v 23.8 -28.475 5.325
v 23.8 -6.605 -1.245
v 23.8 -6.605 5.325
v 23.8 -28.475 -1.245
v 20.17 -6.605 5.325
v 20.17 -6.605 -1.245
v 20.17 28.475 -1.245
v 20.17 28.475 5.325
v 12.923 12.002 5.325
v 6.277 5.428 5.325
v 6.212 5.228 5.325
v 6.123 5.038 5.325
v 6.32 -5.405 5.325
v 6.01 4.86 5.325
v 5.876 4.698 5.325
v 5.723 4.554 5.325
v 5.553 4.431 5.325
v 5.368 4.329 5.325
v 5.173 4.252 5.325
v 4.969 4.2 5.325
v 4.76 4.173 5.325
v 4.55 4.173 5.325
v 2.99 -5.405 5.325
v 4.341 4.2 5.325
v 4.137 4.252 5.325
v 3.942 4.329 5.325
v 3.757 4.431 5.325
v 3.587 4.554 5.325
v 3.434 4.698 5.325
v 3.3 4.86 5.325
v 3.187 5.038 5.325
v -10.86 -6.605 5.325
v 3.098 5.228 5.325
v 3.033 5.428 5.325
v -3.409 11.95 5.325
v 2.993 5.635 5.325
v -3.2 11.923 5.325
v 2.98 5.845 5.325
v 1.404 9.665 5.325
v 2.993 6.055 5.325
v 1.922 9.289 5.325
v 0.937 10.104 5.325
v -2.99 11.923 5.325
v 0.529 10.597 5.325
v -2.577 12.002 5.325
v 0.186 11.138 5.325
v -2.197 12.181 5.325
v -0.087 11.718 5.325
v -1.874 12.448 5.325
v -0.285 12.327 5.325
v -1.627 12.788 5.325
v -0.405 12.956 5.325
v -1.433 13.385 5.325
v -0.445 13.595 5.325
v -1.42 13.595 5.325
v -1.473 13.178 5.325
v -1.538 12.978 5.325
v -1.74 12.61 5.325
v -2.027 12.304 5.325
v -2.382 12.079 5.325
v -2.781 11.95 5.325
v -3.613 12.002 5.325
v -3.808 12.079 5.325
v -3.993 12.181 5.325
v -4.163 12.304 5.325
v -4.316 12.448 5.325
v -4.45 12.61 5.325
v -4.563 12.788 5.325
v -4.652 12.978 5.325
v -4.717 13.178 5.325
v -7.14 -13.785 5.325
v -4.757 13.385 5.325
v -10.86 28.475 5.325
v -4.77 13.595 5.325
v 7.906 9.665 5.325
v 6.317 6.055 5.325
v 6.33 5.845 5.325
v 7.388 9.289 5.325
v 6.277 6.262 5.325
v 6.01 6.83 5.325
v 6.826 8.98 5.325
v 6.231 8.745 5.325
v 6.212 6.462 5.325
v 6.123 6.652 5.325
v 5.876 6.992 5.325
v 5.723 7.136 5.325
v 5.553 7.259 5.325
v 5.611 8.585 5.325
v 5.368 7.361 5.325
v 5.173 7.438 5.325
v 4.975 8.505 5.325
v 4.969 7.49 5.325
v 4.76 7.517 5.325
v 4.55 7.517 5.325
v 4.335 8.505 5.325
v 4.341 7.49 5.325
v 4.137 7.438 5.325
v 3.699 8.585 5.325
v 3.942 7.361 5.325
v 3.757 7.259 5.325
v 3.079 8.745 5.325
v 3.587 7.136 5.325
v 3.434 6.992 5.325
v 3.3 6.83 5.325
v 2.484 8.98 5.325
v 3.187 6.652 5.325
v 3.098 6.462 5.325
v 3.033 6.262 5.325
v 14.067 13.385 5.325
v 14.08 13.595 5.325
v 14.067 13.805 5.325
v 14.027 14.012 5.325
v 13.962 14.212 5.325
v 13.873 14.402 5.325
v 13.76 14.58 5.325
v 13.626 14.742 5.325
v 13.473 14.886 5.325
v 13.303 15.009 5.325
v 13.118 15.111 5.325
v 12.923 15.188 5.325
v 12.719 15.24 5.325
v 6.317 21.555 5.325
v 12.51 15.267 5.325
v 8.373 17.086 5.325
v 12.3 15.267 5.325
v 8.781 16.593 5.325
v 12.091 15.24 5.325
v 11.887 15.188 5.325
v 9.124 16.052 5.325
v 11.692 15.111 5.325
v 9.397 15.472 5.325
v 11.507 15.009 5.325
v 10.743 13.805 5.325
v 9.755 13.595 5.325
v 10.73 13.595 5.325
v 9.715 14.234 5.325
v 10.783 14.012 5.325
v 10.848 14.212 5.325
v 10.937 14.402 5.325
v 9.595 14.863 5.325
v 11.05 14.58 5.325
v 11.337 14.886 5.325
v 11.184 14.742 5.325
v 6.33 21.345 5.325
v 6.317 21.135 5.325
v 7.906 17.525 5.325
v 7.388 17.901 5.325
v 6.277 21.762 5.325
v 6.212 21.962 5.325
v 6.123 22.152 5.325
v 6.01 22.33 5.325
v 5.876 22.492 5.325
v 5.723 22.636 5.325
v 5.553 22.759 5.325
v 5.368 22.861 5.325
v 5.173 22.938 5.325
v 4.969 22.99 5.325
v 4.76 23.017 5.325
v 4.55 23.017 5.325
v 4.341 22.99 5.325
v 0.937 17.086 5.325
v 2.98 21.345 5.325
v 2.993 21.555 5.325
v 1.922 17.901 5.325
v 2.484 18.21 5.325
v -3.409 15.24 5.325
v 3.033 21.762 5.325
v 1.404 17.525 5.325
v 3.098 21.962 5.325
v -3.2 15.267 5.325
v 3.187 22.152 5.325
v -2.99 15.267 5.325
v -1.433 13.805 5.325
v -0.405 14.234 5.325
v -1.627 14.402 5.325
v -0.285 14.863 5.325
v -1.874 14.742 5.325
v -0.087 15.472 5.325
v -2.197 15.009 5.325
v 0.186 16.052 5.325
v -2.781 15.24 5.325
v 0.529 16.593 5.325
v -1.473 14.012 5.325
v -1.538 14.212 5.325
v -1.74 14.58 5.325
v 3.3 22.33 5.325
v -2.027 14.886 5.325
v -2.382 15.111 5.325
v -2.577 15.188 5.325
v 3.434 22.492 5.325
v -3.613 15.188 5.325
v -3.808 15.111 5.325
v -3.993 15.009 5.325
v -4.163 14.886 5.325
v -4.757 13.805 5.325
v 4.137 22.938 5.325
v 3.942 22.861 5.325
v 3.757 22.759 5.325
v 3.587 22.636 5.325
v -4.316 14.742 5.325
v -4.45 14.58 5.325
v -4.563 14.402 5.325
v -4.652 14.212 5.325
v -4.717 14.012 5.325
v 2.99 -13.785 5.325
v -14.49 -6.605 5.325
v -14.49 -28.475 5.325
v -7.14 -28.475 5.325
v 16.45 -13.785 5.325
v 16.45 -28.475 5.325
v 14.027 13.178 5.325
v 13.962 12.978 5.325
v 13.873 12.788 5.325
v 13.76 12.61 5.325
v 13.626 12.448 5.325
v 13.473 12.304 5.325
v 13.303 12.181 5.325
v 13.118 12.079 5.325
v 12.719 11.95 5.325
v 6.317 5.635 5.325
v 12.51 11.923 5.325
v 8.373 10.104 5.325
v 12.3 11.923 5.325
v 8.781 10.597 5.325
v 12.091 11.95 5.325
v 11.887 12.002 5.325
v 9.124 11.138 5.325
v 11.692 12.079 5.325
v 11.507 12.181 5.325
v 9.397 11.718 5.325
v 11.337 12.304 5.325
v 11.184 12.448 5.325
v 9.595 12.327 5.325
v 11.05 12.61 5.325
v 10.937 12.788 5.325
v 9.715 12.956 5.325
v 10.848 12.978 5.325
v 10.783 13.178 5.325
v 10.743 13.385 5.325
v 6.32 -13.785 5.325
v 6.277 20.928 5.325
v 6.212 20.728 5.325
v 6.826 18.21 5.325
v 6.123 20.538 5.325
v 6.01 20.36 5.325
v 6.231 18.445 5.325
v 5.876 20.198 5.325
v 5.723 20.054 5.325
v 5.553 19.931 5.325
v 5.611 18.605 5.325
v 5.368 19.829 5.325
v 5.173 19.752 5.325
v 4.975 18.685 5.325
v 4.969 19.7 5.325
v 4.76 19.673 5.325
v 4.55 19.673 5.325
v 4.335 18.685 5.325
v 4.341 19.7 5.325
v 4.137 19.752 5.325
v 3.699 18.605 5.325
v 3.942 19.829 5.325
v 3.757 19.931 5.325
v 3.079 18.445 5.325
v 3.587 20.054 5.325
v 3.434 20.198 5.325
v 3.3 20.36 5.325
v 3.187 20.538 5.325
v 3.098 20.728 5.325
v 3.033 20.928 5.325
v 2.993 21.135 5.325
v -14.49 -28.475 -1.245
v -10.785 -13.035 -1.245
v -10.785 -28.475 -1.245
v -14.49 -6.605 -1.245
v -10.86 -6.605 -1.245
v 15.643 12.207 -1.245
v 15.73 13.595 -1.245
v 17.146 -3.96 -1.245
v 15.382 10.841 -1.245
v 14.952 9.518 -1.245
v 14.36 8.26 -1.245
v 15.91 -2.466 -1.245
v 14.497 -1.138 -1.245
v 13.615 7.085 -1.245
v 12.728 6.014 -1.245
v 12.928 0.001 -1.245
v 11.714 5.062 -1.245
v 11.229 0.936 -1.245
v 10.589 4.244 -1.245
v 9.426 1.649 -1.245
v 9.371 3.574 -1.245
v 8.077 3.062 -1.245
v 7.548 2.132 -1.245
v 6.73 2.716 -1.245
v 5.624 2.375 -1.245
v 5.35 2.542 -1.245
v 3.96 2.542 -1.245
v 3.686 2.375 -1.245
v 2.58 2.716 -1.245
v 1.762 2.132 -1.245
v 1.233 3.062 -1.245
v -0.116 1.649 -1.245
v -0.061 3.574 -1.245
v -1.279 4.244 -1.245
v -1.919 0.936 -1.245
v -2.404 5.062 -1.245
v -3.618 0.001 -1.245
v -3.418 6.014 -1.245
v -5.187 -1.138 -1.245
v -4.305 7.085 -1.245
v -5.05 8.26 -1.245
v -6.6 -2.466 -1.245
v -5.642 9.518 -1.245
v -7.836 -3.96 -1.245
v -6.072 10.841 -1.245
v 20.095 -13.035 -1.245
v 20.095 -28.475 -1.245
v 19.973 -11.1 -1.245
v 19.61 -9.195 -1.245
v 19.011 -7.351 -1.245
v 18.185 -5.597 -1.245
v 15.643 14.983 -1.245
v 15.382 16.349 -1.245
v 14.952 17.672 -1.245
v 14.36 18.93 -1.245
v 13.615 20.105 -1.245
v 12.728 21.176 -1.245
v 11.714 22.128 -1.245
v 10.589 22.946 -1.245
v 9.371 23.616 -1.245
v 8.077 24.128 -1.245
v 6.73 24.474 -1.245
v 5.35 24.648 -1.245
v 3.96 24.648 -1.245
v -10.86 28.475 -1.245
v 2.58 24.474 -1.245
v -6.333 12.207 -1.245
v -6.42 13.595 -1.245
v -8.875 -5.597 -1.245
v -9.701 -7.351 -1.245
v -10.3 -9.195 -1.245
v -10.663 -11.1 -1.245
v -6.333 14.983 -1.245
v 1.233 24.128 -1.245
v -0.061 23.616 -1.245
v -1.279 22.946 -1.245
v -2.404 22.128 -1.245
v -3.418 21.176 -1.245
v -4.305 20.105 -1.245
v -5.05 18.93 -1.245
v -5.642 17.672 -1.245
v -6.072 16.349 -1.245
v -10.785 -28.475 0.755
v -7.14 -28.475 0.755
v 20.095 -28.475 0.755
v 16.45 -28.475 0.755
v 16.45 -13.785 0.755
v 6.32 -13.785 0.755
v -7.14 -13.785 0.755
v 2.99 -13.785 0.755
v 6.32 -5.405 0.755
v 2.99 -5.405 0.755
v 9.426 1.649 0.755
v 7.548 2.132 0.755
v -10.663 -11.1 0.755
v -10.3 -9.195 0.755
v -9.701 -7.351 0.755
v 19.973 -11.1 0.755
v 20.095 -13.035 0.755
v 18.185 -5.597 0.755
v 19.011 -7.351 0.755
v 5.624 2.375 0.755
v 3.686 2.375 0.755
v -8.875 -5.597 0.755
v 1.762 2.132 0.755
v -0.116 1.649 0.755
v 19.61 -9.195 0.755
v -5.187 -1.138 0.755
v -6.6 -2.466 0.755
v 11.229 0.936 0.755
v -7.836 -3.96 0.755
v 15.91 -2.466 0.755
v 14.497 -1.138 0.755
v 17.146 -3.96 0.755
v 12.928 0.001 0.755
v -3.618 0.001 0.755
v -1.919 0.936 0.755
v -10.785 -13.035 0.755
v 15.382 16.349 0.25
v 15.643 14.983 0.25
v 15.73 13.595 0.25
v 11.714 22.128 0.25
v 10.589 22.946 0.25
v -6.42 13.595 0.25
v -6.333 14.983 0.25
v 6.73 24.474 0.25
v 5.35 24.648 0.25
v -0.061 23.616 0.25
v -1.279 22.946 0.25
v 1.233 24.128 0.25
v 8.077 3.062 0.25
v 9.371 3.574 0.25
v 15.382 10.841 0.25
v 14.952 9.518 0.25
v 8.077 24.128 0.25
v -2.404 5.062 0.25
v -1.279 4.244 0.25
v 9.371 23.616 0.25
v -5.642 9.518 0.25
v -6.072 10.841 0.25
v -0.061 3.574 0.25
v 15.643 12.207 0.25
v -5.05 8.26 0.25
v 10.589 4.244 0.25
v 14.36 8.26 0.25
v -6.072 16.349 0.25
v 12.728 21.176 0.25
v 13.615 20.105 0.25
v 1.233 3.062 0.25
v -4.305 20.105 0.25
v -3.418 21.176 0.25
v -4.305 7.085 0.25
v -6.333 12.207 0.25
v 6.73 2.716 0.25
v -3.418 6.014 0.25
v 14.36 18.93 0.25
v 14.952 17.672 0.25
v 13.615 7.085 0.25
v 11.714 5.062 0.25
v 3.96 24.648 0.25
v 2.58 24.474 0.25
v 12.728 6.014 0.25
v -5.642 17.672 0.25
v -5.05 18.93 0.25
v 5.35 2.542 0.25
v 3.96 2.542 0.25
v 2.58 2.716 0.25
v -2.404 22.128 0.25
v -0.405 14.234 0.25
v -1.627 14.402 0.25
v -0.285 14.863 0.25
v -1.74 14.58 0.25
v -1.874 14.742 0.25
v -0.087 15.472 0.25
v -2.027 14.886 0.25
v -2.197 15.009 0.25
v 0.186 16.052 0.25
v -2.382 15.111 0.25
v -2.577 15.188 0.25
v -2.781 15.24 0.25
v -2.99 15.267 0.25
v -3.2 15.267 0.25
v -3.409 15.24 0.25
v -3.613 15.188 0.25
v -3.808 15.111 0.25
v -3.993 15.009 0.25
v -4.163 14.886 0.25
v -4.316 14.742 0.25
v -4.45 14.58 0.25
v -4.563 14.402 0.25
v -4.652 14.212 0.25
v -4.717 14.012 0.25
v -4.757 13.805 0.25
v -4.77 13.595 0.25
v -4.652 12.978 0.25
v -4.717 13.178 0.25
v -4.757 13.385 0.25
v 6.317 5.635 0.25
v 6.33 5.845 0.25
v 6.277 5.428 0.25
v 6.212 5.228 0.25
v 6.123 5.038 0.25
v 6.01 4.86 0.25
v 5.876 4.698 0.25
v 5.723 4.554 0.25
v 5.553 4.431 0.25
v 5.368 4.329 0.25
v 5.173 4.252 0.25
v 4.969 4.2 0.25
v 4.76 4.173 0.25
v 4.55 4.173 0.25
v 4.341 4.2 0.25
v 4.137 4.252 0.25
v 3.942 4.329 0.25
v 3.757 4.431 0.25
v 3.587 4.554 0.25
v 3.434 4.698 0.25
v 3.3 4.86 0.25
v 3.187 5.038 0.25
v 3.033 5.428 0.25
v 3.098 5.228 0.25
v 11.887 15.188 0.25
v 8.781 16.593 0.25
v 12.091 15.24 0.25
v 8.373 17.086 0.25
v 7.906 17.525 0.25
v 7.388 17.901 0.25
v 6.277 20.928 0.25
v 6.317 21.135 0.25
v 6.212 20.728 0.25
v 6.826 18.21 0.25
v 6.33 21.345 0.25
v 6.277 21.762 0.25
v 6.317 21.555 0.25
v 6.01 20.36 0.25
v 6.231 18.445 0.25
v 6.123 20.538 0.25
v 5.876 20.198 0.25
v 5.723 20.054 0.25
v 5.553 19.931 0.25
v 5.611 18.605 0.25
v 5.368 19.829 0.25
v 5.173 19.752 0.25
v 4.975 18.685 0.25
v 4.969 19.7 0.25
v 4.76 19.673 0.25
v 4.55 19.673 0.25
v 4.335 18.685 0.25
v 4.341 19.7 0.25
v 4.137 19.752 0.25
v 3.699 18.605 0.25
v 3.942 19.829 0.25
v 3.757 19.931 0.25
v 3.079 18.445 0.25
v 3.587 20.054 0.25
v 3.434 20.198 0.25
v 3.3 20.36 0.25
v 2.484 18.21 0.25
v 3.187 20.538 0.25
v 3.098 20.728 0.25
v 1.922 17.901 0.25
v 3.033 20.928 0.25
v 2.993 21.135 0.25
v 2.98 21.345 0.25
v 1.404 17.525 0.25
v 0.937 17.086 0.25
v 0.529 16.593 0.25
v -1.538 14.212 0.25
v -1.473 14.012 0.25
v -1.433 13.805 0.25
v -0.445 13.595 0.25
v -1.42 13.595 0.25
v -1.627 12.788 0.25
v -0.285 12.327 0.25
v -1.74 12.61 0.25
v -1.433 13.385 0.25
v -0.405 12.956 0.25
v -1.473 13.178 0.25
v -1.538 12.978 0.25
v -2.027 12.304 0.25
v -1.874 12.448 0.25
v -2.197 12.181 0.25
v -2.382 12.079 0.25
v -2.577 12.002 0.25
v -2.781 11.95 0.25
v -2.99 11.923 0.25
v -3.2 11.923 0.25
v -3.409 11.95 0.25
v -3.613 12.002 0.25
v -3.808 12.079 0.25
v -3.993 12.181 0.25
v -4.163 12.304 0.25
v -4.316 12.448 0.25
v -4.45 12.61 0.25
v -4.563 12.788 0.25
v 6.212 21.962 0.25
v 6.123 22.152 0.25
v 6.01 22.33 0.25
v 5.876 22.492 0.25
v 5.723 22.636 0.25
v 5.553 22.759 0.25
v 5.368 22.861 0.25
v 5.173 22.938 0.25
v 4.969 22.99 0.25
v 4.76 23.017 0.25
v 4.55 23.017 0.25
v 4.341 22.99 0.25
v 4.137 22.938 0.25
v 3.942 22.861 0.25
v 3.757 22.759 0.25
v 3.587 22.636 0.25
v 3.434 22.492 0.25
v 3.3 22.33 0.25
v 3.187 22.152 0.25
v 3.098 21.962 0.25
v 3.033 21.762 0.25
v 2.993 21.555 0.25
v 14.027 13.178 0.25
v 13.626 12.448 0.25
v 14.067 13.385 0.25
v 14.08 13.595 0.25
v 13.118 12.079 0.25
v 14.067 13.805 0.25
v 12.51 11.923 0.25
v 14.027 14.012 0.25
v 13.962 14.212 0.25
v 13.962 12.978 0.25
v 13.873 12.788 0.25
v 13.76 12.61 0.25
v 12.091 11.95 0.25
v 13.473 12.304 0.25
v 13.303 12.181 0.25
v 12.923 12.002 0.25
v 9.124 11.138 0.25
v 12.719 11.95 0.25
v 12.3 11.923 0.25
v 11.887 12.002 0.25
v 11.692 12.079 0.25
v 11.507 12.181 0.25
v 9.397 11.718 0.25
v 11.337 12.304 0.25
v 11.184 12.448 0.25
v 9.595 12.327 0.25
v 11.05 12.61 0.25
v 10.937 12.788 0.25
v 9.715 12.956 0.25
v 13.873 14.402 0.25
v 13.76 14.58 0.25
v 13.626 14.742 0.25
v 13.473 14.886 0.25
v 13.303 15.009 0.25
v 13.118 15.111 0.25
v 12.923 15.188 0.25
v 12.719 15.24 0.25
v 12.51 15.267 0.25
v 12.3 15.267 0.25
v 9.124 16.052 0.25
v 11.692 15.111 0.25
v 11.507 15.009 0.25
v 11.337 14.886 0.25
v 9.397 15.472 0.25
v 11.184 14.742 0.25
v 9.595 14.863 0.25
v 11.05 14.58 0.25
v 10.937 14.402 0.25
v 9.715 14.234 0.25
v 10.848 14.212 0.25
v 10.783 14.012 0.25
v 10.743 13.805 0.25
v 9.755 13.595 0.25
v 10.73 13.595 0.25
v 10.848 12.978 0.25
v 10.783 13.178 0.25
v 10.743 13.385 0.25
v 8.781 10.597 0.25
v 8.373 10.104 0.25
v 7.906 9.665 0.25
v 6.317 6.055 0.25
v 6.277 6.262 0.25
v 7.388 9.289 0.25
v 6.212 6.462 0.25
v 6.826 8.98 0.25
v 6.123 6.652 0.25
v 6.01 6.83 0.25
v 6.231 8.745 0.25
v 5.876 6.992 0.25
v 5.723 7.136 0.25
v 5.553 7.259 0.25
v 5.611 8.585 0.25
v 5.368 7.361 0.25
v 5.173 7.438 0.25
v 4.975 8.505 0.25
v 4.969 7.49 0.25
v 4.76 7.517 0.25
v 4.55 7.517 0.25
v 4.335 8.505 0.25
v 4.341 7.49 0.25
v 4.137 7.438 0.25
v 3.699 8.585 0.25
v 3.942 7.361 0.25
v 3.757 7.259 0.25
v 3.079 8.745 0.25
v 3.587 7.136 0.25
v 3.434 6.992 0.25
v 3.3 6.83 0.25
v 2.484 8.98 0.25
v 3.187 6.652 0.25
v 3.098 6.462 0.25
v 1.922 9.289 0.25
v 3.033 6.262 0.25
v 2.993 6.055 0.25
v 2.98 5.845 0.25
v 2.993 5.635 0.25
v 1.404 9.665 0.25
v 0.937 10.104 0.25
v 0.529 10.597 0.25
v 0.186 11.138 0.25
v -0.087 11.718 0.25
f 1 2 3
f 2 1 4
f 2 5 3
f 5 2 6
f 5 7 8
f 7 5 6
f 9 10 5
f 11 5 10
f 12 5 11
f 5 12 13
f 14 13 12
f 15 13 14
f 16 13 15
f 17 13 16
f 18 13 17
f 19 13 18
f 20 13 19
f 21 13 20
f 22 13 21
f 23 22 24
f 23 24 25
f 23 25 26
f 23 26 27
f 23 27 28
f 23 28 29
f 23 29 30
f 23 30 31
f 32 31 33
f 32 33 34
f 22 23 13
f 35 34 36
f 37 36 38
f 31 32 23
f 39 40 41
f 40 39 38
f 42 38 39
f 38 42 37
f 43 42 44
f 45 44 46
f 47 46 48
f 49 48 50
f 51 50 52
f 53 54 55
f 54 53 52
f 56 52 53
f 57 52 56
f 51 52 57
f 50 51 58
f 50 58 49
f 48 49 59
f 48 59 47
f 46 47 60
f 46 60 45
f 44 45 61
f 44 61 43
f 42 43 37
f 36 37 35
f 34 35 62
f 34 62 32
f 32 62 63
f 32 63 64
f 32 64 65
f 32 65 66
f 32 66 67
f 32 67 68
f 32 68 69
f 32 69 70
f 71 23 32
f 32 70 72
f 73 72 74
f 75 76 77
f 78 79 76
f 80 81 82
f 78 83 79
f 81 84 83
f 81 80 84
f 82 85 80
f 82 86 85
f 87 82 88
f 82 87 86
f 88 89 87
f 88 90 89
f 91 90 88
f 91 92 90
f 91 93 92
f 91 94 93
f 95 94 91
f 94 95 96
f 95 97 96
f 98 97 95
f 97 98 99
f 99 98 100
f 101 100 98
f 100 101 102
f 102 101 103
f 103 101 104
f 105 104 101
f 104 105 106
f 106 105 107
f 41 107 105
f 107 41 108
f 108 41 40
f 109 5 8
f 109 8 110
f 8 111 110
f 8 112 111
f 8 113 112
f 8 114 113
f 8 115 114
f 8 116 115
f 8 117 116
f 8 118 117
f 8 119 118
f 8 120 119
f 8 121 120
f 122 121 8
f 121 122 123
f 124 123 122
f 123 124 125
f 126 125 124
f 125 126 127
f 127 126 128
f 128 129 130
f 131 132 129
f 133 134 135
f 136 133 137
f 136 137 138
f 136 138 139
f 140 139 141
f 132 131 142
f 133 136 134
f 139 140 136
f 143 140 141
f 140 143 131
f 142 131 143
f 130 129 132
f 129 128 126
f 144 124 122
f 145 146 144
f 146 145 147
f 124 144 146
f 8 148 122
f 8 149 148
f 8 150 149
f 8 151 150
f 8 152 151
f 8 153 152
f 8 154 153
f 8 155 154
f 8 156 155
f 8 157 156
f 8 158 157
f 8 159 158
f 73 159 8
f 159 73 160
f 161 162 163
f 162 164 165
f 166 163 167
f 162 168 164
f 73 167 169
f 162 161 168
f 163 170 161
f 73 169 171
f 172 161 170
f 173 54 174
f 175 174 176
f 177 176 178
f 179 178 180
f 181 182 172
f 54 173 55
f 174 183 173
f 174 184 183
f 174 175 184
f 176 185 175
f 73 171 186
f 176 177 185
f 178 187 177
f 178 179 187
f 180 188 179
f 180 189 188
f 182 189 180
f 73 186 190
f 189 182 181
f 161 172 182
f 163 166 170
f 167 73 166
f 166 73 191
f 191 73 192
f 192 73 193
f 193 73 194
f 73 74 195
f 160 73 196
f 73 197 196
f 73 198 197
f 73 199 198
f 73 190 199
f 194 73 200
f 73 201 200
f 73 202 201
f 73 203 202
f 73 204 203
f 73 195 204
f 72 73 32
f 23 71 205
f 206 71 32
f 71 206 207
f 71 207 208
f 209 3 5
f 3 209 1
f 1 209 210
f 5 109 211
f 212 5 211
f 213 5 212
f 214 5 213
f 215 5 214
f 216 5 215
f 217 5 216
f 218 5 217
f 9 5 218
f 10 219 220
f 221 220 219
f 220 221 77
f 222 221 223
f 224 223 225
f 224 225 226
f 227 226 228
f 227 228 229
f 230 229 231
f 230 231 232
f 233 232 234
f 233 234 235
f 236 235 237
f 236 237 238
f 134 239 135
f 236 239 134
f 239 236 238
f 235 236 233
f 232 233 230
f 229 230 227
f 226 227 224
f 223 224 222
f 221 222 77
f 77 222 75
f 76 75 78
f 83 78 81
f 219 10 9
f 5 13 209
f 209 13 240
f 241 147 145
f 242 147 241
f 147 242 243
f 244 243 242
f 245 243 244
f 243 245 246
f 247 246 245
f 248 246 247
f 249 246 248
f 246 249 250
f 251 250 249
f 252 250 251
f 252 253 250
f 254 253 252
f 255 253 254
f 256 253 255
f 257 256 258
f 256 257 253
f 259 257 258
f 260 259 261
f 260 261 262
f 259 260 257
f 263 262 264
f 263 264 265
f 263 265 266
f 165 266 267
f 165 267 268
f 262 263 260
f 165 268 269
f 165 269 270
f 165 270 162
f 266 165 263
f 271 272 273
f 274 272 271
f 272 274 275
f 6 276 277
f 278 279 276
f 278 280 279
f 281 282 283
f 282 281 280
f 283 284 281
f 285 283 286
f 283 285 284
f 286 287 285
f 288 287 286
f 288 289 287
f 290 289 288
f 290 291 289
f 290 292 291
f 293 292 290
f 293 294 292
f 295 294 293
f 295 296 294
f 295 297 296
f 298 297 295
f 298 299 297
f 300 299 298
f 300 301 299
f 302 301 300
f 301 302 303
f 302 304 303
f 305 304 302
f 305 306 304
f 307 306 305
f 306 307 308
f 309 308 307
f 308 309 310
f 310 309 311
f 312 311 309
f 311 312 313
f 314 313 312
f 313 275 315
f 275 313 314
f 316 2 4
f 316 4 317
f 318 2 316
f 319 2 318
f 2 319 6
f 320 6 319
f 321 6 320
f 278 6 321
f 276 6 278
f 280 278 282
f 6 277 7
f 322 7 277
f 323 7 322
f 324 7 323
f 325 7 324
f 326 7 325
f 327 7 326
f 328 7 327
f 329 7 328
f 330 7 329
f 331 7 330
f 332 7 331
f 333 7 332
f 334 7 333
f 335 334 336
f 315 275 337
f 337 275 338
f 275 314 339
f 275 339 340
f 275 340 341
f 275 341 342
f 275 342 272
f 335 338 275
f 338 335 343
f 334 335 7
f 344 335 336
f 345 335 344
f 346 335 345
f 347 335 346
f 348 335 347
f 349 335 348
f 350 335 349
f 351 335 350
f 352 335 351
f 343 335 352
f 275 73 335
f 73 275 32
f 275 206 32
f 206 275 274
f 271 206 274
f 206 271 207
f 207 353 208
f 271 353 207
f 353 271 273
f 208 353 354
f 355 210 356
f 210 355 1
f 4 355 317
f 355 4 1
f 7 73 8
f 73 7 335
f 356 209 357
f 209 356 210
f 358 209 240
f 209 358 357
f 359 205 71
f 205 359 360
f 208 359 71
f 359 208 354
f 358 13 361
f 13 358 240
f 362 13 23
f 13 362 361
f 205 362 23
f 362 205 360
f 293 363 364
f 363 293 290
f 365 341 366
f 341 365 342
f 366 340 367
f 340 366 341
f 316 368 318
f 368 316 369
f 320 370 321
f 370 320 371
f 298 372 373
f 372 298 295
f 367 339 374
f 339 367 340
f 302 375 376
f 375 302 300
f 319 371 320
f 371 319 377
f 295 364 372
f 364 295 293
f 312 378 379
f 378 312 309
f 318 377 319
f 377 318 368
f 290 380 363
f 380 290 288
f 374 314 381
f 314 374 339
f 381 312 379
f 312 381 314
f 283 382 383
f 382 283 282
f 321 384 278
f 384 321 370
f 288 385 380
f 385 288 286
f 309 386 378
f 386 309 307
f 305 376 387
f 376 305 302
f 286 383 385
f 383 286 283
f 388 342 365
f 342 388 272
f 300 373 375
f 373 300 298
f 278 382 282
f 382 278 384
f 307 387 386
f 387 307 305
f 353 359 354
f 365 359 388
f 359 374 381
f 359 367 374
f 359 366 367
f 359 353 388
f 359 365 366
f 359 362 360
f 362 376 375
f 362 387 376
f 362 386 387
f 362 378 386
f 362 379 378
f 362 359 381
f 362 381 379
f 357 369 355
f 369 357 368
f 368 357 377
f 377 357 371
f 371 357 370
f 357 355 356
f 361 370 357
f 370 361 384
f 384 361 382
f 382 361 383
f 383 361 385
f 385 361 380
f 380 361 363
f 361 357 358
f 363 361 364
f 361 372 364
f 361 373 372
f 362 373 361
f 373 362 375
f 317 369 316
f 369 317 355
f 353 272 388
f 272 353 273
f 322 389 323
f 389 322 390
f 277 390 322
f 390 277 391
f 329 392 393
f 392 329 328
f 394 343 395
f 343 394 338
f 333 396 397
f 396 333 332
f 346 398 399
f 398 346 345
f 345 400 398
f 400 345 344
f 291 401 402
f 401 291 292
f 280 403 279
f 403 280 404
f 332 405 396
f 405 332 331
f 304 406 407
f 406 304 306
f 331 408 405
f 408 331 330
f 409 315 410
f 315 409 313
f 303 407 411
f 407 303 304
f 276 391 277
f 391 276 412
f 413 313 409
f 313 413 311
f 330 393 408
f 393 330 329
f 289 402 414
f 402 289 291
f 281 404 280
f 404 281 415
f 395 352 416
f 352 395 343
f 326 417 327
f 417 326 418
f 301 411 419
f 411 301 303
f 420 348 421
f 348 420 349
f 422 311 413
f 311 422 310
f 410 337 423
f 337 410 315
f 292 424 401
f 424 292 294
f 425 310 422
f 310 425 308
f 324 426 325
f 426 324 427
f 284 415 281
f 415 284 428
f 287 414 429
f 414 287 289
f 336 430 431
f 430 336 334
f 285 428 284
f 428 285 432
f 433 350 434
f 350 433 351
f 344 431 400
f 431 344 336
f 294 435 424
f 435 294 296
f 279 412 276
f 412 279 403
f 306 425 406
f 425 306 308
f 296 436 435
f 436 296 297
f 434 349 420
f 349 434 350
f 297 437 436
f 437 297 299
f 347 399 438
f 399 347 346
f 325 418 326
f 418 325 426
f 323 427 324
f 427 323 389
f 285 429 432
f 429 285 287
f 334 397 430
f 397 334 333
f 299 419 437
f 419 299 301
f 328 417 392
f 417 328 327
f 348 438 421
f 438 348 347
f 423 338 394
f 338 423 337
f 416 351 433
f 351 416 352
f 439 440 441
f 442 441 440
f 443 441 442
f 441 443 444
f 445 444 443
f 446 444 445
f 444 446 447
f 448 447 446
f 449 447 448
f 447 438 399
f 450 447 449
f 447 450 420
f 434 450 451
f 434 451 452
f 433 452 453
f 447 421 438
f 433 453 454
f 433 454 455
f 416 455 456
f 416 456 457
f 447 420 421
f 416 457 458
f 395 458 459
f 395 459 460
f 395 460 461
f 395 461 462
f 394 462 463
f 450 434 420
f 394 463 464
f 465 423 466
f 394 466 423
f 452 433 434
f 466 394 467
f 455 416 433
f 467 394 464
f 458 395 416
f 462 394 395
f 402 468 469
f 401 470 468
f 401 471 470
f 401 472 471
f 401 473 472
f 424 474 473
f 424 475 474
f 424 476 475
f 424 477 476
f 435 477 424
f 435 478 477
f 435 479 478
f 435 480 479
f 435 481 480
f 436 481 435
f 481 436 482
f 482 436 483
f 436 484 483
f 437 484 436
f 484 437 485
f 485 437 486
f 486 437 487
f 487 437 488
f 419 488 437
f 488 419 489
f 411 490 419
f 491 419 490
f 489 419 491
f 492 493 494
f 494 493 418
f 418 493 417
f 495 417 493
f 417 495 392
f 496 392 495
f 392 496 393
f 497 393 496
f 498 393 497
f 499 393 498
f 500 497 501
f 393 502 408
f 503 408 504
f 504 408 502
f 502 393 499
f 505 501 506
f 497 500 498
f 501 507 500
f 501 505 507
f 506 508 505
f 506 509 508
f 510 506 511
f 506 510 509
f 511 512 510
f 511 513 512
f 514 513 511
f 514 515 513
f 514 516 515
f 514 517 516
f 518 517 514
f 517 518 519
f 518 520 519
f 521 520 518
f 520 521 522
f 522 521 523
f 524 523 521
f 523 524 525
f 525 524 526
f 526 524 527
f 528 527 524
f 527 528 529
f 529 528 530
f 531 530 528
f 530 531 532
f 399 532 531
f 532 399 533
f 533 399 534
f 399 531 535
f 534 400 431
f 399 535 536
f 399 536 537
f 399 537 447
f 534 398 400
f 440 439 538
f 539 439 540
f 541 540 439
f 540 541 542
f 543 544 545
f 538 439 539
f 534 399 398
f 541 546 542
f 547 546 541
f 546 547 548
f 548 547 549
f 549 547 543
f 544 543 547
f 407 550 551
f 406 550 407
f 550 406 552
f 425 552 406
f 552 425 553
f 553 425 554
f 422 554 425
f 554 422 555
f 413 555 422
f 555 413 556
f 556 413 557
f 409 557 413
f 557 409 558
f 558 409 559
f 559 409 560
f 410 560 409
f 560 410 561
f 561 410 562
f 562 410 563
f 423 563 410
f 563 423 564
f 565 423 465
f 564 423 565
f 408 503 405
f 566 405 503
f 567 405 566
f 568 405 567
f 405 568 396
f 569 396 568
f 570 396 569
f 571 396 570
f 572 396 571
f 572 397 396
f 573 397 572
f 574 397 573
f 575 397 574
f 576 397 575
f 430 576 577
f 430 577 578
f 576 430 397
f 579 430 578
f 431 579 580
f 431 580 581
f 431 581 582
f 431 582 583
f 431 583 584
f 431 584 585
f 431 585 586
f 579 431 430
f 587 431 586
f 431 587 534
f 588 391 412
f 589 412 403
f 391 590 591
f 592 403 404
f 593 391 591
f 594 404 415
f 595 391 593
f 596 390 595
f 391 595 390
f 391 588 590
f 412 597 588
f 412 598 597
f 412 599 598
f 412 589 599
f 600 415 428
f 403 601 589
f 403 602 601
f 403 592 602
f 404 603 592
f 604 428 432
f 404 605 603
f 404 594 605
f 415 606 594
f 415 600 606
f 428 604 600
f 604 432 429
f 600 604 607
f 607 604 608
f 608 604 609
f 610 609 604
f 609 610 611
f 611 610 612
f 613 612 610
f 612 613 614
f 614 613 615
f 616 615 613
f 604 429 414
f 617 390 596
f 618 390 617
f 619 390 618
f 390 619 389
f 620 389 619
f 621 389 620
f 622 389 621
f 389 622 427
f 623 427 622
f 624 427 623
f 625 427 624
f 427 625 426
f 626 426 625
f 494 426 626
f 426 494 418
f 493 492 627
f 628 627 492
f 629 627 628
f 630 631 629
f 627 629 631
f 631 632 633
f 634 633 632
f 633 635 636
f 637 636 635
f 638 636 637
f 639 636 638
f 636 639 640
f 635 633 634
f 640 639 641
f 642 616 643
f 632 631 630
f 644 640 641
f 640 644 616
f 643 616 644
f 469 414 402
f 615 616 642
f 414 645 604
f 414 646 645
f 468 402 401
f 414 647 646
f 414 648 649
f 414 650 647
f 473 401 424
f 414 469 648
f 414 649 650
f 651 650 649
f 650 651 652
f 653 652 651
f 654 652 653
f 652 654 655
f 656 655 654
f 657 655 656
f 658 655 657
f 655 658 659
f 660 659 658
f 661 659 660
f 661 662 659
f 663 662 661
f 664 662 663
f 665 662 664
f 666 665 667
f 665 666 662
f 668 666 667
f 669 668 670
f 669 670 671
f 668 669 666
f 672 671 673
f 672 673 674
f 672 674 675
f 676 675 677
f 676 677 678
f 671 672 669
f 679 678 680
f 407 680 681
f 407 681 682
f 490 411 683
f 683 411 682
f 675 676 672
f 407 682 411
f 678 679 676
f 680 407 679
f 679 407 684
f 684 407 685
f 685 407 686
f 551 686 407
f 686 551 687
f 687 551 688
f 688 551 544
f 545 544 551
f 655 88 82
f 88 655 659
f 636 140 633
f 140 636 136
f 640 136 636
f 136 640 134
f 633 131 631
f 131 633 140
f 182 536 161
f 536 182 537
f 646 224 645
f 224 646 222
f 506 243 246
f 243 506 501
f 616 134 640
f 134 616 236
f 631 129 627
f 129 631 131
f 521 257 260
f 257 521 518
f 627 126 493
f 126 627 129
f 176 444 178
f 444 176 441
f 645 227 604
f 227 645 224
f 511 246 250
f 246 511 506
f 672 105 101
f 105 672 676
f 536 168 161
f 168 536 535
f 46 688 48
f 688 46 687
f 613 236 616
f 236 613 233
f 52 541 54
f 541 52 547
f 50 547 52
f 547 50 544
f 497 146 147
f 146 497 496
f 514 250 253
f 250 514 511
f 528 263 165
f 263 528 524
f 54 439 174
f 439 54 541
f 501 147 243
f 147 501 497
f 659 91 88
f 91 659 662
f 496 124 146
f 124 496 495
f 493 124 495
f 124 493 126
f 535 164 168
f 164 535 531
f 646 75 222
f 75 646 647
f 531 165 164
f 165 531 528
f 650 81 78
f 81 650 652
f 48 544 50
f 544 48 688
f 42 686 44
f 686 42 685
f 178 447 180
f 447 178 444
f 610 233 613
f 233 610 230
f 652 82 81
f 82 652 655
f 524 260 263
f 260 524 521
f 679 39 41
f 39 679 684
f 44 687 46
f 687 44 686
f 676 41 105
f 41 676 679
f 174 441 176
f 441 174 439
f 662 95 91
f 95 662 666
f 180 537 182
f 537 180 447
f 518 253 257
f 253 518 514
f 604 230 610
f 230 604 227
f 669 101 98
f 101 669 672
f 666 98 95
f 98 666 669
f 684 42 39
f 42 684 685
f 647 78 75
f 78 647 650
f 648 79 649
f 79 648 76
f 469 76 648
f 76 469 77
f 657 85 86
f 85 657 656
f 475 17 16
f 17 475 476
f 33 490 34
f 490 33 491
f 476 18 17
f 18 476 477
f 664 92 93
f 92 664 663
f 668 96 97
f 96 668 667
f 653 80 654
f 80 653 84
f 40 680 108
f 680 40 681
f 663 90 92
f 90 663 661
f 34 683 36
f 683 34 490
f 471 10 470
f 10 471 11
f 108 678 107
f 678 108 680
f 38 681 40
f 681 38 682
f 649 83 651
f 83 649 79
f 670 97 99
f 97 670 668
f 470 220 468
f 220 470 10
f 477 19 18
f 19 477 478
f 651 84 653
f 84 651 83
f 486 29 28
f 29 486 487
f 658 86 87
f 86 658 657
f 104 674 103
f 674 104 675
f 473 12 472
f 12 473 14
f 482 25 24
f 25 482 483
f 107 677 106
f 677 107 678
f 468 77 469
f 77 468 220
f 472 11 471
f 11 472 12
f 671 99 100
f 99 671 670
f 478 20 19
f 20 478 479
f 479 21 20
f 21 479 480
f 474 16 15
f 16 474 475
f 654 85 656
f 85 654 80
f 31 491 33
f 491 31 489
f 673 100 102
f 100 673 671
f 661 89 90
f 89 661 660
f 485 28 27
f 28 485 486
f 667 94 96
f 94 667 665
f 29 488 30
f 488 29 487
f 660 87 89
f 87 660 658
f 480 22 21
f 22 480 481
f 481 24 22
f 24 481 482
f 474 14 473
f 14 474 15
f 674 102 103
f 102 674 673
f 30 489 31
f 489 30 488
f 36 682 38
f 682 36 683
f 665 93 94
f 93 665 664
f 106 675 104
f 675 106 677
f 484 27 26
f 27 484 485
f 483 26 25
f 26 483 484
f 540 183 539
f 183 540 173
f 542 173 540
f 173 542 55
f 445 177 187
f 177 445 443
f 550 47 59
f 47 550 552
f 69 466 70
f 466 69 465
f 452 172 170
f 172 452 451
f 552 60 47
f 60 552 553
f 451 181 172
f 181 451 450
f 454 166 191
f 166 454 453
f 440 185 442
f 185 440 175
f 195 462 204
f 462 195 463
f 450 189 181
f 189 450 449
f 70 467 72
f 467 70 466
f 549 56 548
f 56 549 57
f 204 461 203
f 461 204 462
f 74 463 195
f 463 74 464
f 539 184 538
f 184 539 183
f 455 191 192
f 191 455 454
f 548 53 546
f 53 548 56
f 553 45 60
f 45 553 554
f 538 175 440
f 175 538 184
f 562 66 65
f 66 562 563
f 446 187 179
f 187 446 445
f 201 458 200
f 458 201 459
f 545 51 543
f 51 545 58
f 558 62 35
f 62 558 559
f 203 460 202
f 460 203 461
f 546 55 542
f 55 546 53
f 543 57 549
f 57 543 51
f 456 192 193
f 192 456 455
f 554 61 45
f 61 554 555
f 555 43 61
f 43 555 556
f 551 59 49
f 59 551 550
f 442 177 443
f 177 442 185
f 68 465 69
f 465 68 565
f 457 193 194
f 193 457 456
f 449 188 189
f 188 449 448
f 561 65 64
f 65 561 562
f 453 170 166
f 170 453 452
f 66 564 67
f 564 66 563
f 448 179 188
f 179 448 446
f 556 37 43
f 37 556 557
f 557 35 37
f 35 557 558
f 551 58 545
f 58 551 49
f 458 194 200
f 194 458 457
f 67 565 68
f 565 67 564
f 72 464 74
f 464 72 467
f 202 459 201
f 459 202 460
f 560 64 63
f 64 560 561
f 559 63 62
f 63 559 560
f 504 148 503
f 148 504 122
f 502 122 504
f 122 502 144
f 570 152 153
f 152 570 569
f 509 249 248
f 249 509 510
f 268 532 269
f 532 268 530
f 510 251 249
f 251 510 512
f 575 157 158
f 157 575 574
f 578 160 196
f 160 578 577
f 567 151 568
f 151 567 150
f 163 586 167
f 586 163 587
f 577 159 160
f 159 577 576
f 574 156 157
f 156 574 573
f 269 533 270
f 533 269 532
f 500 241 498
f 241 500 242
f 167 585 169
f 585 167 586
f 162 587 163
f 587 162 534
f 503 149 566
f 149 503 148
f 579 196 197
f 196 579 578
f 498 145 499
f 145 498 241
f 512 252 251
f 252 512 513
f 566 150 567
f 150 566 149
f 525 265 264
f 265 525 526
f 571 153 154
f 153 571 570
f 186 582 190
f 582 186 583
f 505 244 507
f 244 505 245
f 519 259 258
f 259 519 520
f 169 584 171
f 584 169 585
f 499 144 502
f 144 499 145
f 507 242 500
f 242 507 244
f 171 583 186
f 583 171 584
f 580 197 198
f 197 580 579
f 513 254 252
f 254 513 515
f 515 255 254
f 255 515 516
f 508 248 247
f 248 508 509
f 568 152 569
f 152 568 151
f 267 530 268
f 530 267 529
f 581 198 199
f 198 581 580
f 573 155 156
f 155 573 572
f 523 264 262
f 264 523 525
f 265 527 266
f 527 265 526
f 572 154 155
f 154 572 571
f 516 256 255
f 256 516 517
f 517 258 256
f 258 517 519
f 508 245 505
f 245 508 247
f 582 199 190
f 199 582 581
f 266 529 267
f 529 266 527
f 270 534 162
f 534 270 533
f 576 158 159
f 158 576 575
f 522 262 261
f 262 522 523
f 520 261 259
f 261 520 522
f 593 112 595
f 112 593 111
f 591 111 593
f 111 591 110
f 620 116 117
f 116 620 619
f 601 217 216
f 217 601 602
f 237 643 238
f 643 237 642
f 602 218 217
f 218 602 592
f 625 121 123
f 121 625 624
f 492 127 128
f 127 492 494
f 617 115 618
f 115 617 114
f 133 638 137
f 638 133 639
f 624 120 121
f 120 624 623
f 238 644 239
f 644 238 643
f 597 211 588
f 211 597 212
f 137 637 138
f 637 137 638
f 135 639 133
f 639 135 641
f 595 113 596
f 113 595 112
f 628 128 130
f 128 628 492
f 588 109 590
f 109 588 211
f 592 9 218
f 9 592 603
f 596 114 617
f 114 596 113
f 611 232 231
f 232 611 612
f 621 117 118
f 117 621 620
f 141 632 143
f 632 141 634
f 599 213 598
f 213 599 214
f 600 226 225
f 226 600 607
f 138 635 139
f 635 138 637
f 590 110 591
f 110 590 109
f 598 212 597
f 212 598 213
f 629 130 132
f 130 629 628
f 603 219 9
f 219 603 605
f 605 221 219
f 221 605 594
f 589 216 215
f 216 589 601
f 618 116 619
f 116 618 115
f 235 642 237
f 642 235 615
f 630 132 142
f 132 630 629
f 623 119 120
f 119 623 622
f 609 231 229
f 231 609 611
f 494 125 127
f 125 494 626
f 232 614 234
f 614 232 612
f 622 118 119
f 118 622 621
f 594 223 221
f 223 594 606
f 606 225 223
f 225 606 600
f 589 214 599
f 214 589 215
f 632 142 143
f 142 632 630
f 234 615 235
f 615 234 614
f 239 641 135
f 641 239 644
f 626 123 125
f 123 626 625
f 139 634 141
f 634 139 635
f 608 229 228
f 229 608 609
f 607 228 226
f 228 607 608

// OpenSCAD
$fn=50;


height=59.35 - 2.4;
width=47.60;
thickness=10.65;

topWidth=38.29;
topHeight=23.70;
bottomWidth=31.10;
bottomHeight=height-topHeight;
thickness3=6.57; //thickness of support**



diameter=28.88;



circleThickness=2;
radius=diameter/2 + 1;

smallRecHeight=8.38;
smallRecWidth=3.33;
cuttingWidth=23.59;
cuttingHeight=14.69;
extraHeight = (height - (smallRecHeight + cuttingHeight));
extraWidth = 3.63; // width of axis board

bigCircleDiameter=27.33;
topHalfHeight=29.63;
remaindingHeight=height-topHalfHeight;

hex_nut_diameter=7.89 + 1.6; // +1.6, 
hex_nut_radius=hex_nut_diameter/2;
hex_nut_thickness=3.85;

hex_nut_inner_diameter= 5.8;//5;
hex_nut_inner_radius=hex_nut_inner_diameter/2 + .4;



temp=(thickness/2) - (thickness - thickness3);
offsetFromCenter=19; //19.25; //1.5 // 2.3
hexNutGroveExtraDepth=2;

screwRadius=1.75;
screwDepth=19.35; //increase depth

module part1(){
translate([(width/2) - (topWidth/2) ,(thickness/2) - (thickness3)/2,0]) color("blue") difference(){    
    difference(){
cube([topWidth, thickness3, height], center=true);  

union(){
color("blue") translate([topWidth/2 - (extraWidth/2),0,-extraHeight/2 + ( (height/2) - (smallRecHeight + cuttingHeight) )]) cube([extraWidth,thickness3 ,extraHeight+2.4],center=true);

color("blue") translate([ -(topWidth/2 - (extraWidth/2)),0,-extraHeight/2 + ( (height/2) - (smallRecHeight + cuttingHeight) )]) cube([extraWidth,thickness3 ,extraHeight+2.4],center=true);
}


//translate([0,0,extraHeight - (height/2) - offsetFromCenter]) union(){
//    //-(remaindingHeight/2) + (hex_nut_radius)
//translate([0,5,0]) color("black") rotate([90,0,0]) cylinder(h=hex_nut_thickness/2 + hexNutGroveExtraDepth + 1.3, r=hex_nut_radius,center=true, $fn = 6); //h=thickness3
////-(remaindingHeight/2) + (hex_nut_inner_radius + (hex_nut_radius - hex_nut_inner_radius))
//translate([0, 0,0]) color("red") rotate([90,0,0]) cylinder(h=hex_nut_thickness/2 + 10, r=hex_nut_inner_radius,center=true, $fn = 6);
//}


}
union(){
    translate([0,-((-(thickness3/2)+(thickness3-circleThickness)/2)),(height/2) - (smallRecHeight + cuttingHeight) ]) union(){
translate([0,0,(cuttingHeight/2) + (smallRecHeight)]) cube([cuttingWidth,thickness3 - circleThickness +.1, cuttingHeight],center=true);
                 translate([0,0,smallRecHeight/2]) cube([smallRecWidth,thickness3 - circleThickness+.1,smallRecHeight],center=true);            
}


translate([0,-(thickness3/2 - (circleThickness/2)),(height/2) - (radius)]) color("red")rotate([90,0,0])union(){
        cylinder(h=circleThickness, r=radius, center=true);
        translate([0,radius/2,0])cube([radius*2,radius,circleThickness],center=true);
    }
    
    }

}
}


module part2(){
//translate([0,temp,0]) 
difference(){
translate([0,-5,0]) color("blue")
cube([width,thickness,height],center=true);
//translate([0,(thickness/2) - (thickness - thickness3)/2,0]) color("blue") cube([topWidth,thickness - thickness3,height],center=true);
//
translate([(width/2) - (topWidth/2),(thickness/2) - (thickness3)/2,0]) color("blue") union(){
cube([topWidth, thickness3, height], center=true);   
union(){
color("red") translate([topWidth/2 - (extraWidth/2),0,-extraHeight/2 + ( (height/2) - (smallRecHeight + cuttingHeight) )]) cube([extraWidth,thickness3+20 ,extraHeight+2.4],center=true); //slot **

color("red") translate([ -(topWidth/2 - (extraWidth/2))-0.5,0,-extraHeight/2 + ( (height/2) - (smallRecHeight + cuttingHeight) )]) cube([extraWidth+0.5,thickness3+20,extraHeight+2.4],center=true);
}


//translate([0,0, extraHeight - (height/2)  - offsetFromCenter]) union(){
//    
//translate([0, -temp - (hex_nut_thickness/2) - .8,0]) color("red") rotate([90,0,0]) cylinder(h=hex_nut_thickness/2 + hexNutGroveExtraDepth, r=hex_nut_radius,center=true, $fn = 6);
//
//translate([0, -temp - (hex_nut_thickness/2),0]) color("red") rotate([90,0,0]) cylinder(h=hex_nut_thickness/2 + 7, r=hex_nut_inner_radius,center=true, $fn = 6);
//}


}
}

}

module glueScrews(){
translate([0,0.1,0]) union(){
rotate([90,0,0]) translate([(width/2) - (topWidth/2) - (topWidth/4),-(height/3),-(thickness-screwDepth)/2]) cylinder(h=screwDepth,r=screwRadius,center=true);

rotate([90,0,0]) translate([(width/2) - (topWidth/2) + (topWidth/4),-(height/9),-(thickness-screwDepth)/2]) cylinder(h=screwDepth,r=screwRadius,center=true);
}
}


module modifiedParts(part=1){


difference(){
    
        if(part == 1){
            part1();
        }else if(part == 2){
            part2();
        }
//        part2();    

    
//translate([(width/2) - (topWidth/2),0,extraHeight - (height/2) - offsetFromCenter]) union(){
//    //-(remaindingHeight/2) + (hex_nut_radius)
//    
//    //((hex_nut_thickness/2 + 10)/2)-(hex_nut_thickness/2 + hexNutGroveExtraDepth + 1.3)/2
//
//    
////-(remaindingHeight/2) + (hex_nut_inner_radius + (hex_nut_radius - hex_nut_inner_radius))
//
//
//translate([0,0,0]) color("black") rotate([90,0,0]) cylinder(h=hex_nut_thickness, r=hex_nut_radius,center=true, $fn = 6); //h=thickness3
//
//translate([0, 0,0]) color("red") rotate([90,0,0]) cylinder(h=hex_nut_thickness+ 20, r=hex_nut_inner_radius,center=true, $fn = 6);
//    
//
////    glueScrews();
//}

}
}

//translate([3.5,11,0]) cylinder(d=21.95,h=3.5,$fn=50,center=true);

//translate([(width/2) - (topWidth/2),-(extraHeight - (height/2) - offsetFromCenter),0]) cylinder(d=21.95,h=3.5,$fn=50,center=true);

//union(){
//translate([(width/2) - (topWidth/2),-(extraHeight - (height/2) - offsetFromCenter)-7.75,0]) cylinder(h=15,d=3.75,center=true);
//translate([(width/2) - (topWidth/2) -7.75,-(extraHeight - (height/2) - offsetFromCenter),0]) cylinder(h=15,d=3.75,center=true);
//translate([(width/2) - (topWidth/2) +7.75,-(extraHeight - (height/2) - offsetFromCenter),0]) cylinder(h=15,d=3.75,center=true);
//translate([(width/2) - (topWidth/2) ,-(extraHeight - (height/2) - offsetFromCenter) + 7.75,0]) cylinder(h=15,d=3.75,center=true);
//}


//rotate([-90,0,0]) difference(){
//modifiedParts(1);
//   glueScrews(); 
//}

//rotate([90,0,0]) translate([(width/2) - (topWidth/2),-(0),extraHeight - (height/2) - offsetFromCenter]) cylinder(d=21.95,h=3.5,$fn=50,center=true);

//rotate([90,0,0]) modifiedParts(1);

difference(){
difference(){
rotate([90,0,0]) difference(){

modifiedParts();
//    translate([(width/2) - (topWidth/2),-(extraHeight - (height/2) - offsetFromCenter),0]) cylinder(d=21.95,h=3.5,$fn=50,center=true);
//    glueScrews();
    
}

difference(){
//translate([0,0,.85])
    union(){
//translate([(width/2) - (topWidth/2),-(extraHeight - (height/2) - offsetFromCenter) ,-1.5]) cylinder(d=21.95 + .2,h=3.5,$fn=50,center=true);
//    
//    translate([(width/2) - (topWidth/2),-(extraHeight - (height/2) - offsetFromCenter),0]) cylinder(h=15,d=10 + .2,center=true);
    
    translate([(width/2) - (topWidth/2),-(extraHeight - (height/2) - offsetFromCenter) ,-1.5]) cylinder(d=21.95 + .2,h=3.5,$fn=50,center=true);
    
    translate([(width/2) - (topWidth/2),-(extraHeight - (height/2) - offsetFromCenter),0]) cylinder(h=25,d=10 + .2,center=true);
}


}

}


union(){
translate([(width/2) - (topWidth/2),-(extraHeight - (height/2) - offsetFromCenter)-7.75 ,0]) cylinder(h=25,d=3.75 - .4,center=true);
translate([(width/2) - (topWidth/2) -7.75 ,-(extraHeight - (height/2) - offsetFromCenter),0]) cylinder(h=25,d=3.75 - .4,center=true);
translate([(width/2) - (topWidth/2) ,-(extraHeight - (height/2) - offsetFromCenter) + 7.75 ,0]) cylinder(h=25,d=3.75 - .4,center=true);
translate([(width/2) - (topWidth/2) +7.75 ,-(extraHeight - (height/2) - offsetFromCenter),0]) cylinder(h=25,d=3.75 - .4,center=true);

}

}
